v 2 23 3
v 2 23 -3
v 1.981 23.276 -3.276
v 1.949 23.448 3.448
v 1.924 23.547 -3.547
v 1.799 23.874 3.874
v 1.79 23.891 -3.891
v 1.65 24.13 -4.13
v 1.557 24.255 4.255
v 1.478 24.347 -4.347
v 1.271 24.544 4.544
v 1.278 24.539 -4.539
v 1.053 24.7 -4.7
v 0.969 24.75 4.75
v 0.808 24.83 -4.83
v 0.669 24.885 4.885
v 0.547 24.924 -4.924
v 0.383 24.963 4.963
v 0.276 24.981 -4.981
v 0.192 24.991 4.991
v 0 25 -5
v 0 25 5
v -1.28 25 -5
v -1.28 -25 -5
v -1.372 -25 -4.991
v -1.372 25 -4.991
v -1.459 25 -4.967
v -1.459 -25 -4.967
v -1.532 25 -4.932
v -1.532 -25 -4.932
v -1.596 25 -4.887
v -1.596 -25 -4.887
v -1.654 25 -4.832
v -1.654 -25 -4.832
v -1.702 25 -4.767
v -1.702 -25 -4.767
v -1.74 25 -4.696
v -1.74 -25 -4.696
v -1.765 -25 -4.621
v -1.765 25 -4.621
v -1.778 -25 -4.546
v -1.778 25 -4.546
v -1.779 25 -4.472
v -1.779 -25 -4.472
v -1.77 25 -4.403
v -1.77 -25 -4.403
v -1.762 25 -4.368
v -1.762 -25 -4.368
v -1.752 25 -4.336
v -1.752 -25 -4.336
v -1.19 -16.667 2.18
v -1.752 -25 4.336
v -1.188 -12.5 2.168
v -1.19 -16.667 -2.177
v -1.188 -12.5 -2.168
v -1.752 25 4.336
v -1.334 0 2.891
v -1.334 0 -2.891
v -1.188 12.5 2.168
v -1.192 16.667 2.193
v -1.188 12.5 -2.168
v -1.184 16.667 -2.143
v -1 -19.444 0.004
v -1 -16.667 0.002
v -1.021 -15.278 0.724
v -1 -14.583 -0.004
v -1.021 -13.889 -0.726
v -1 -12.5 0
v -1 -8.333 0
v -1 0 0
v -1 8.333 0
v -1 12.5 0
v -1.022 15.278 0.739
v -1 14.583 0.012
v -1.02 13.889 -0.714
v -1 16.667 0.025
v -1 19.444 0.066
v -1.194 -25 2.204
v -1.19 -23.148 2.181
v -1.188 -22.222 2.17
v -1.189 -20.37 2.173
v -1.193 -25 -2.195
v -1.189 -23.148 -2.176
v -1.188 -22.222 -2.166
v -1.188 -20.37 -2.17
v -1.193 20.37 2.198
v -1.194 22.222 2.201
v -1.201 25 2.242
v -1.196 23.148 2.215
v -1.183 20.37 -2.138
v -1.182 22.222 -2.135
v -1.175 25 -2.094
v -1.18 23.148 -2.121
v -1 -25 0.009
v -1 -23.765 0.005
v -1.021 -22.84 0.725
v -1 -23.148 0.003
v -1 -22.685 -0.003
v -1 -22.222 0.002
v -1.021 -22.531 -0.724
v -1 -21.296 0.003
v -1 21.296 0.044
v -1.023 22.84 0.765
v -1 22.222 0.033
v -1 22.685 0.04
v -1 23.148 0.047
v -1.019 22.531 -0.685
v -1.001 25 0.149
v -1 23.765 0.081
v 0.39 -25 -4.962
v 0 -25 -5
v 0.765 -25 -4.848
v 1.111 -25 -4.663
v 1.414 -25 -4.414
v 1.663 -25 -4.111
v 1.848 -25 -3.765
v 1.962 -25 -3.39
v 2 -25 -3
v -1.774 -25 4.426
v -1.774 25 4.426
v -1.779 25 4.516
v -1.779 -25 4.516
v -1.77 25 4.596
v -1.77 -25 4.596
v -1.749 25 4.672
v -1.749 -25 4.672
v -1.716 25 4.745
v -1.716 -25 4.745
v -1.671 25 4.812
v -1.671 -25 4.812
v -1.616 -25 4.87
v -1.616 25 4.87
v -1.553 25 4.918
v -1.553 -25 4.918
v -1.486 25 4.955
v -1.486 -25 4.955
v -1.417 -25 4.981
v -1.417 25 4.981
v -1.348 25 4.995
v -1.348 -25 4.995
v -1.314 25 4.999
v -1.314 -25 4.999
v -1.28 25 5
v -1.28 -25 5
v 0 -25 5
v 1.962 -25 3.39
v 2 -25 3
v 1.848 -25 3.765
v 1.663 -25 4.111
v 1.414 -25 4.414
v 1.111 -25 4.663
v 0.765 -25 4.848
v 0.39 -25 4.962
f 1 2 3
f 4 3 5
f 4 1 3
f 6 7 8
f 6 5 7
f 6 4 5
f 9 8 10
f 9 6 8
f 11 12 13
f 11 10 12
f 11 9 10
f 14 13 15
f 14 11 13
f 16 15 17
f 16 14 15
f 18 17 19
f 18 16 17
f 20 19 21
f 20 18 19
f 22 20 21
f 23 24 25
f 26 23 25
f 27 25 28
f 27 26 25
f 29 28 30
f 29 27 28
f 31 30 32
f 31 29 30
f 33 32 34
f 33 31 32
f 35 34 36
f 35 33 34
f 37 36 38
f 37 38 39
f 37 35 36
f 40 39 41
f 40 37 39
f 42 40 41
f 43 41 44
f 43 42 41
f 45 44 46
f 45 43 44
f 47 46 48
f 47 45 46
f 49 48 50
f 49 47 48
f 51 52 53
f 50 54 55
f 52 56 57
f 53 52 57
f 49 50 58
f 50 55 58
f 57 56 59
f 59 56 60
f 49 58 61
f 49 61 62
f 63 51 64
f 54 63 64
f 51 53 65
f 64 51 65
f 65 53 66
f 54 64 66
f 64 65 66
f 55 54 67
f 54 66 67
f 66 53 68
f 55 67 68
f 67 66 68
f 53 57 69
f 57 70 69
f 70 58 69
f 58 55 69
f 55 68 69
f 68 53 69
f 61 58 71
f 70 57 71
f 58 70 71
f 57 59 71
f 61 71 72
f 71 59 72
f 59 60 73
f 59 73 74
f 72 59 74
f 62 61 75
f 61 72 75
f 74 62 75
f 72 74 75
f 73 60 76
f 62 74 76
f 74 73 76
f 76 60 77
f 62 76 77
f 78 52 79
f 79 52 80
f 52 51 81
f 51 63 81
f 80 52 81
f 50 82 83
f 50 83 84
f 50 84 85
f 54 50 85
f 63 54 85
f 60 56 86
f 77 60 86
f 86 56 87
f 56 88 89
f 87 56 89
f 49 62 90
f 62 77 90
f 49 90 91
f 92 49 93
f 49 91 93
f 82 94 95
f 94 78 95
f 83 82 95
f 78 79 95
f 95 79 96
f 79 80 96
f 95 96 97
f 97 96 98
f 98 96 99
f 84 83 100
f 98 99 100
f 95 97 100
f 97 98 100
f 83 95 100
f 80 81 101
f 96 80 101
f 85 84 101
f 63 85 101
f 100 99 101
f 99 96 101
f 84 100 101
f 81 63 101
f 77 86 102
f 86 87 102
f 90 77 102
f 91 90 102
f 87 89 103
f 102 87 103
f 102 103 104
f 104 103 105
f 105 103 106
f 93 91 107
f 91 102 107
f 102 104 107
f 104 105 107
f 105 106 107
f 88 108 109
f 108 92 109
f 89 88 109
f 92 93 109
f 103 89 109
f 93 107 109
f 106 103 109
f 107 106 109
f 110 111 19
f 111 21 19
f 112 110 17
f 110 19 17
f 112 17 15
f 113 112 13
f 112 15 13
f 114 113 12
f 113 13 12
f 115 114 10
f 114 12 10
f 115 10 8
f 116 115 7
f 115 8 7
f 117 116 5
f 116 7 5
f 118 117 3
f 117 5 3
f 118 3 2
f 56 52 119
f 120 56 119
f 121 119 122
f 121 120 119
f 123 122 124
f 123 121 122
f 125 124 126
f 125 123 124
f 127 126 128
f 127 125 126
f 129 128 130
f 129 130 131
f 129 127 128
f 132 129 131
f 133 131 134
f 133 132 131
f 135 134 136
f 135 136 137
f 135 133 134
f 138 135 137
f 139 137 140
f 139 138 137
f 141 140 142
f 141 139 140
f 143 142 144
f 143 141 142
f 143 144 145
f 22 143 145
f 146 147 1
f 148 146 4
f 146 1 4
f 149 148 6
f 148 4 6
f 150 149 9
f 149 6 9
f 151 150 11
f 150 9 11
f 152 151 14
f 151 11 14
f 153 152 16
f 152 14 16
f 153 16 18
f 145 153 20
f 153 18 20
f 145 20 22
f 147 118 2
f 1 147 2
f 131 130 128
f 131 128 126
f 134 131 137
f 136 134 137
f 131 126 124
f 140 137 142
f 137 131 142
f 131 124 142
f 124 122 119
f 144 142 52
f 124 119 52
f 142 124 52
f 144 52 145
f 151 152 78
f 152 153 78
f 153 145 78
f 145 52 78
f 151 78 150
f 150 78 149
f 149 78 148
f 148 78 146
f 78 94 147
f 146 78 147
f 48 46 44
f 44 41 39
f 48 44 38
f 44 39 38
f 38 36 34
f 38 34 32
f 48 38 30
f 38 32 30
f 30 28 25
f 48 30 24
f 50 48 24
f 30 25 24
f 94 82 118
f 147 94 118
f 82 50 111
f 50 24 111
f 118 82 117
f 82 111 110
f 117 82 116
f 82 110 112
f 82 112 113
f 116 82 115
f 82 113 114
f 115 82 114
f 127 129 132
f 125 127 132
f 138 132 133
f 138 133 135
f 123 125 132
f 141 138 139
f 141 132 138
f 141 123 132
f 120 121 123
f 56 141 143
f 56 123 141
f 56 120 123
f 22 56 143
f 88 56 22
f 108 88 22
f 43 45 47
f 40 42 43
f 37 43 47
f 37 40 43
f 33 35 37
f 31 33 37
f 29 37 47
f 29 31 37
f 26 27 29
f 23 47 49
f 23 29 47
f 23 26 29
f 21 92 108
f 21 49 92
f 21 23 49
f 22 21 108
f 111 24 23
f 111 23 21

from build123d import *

# Parameters (mm, degrees)
BOSS_EXTRUDE1_DEPTH      = 5
BOSS_EXTRUDE1_DEPTH_BACK = 5
SKETCH1_W                = 4
SKETCH1_H                = 50
CUT_EXTRUDE1_DEPTH       = 60
FILLET2_R                = 2
FILLET3_R                = 0.5


with BuildPart() as part:
    # Sketch1 → Boss-Extrude1 (new, two sides: drawn at the far end of the back side and taken through both)
    with BuildSketch(Plane.XY.offset(-BOSS_EXTRUDE1_DEPTH_BACK)):
        Rectangle(SKETCH1_W, SKETCH1_H)
    extrude(amount=BOSS_EXTRUDE1_DEPTH + BOSS_EXTRUDE1_DEPTH_BACK)

    # Sketch2 → Cut-Extrude1 (cut)
    with BuildSketch(Plane(origin=(0, 25, 0), x_dir=(1, 0, 0), z_dir=(0, 1, 0))):
        with BuildLine():
            Line((-2, 5), (-2, -5))
            add(Edge.make_bspline(
                [(-2, -5), (0, 0), (-2, 5)],
                knots=[0.5, 0.5, 0.5, 1.5, 1.5, 1.5], degree=2))
        make_face()
    extrude(amount=-CUT_EXTRUDE1_DEPTH, mode=Mode.SUBTRACT)

    # Fillet2
    fillet2_edges = [part.edges().sort_by_distance(p)[0] for p in [
        (2, 0, -5),
        (2, 25, 0),
        (2, 0, 5),
    ]]
    fillet(fillet2_edges, radius=FILLET2_R)

    # Fillet3
    fillet3_edges = [part.edges().sort_by_distance(p)[0] for p in [
        (-2, 0, -5),
        (-2, 0, 5),
    ]]
    fillet(fillet3_edges, radius=FILLET3_R)


solid = part.part
